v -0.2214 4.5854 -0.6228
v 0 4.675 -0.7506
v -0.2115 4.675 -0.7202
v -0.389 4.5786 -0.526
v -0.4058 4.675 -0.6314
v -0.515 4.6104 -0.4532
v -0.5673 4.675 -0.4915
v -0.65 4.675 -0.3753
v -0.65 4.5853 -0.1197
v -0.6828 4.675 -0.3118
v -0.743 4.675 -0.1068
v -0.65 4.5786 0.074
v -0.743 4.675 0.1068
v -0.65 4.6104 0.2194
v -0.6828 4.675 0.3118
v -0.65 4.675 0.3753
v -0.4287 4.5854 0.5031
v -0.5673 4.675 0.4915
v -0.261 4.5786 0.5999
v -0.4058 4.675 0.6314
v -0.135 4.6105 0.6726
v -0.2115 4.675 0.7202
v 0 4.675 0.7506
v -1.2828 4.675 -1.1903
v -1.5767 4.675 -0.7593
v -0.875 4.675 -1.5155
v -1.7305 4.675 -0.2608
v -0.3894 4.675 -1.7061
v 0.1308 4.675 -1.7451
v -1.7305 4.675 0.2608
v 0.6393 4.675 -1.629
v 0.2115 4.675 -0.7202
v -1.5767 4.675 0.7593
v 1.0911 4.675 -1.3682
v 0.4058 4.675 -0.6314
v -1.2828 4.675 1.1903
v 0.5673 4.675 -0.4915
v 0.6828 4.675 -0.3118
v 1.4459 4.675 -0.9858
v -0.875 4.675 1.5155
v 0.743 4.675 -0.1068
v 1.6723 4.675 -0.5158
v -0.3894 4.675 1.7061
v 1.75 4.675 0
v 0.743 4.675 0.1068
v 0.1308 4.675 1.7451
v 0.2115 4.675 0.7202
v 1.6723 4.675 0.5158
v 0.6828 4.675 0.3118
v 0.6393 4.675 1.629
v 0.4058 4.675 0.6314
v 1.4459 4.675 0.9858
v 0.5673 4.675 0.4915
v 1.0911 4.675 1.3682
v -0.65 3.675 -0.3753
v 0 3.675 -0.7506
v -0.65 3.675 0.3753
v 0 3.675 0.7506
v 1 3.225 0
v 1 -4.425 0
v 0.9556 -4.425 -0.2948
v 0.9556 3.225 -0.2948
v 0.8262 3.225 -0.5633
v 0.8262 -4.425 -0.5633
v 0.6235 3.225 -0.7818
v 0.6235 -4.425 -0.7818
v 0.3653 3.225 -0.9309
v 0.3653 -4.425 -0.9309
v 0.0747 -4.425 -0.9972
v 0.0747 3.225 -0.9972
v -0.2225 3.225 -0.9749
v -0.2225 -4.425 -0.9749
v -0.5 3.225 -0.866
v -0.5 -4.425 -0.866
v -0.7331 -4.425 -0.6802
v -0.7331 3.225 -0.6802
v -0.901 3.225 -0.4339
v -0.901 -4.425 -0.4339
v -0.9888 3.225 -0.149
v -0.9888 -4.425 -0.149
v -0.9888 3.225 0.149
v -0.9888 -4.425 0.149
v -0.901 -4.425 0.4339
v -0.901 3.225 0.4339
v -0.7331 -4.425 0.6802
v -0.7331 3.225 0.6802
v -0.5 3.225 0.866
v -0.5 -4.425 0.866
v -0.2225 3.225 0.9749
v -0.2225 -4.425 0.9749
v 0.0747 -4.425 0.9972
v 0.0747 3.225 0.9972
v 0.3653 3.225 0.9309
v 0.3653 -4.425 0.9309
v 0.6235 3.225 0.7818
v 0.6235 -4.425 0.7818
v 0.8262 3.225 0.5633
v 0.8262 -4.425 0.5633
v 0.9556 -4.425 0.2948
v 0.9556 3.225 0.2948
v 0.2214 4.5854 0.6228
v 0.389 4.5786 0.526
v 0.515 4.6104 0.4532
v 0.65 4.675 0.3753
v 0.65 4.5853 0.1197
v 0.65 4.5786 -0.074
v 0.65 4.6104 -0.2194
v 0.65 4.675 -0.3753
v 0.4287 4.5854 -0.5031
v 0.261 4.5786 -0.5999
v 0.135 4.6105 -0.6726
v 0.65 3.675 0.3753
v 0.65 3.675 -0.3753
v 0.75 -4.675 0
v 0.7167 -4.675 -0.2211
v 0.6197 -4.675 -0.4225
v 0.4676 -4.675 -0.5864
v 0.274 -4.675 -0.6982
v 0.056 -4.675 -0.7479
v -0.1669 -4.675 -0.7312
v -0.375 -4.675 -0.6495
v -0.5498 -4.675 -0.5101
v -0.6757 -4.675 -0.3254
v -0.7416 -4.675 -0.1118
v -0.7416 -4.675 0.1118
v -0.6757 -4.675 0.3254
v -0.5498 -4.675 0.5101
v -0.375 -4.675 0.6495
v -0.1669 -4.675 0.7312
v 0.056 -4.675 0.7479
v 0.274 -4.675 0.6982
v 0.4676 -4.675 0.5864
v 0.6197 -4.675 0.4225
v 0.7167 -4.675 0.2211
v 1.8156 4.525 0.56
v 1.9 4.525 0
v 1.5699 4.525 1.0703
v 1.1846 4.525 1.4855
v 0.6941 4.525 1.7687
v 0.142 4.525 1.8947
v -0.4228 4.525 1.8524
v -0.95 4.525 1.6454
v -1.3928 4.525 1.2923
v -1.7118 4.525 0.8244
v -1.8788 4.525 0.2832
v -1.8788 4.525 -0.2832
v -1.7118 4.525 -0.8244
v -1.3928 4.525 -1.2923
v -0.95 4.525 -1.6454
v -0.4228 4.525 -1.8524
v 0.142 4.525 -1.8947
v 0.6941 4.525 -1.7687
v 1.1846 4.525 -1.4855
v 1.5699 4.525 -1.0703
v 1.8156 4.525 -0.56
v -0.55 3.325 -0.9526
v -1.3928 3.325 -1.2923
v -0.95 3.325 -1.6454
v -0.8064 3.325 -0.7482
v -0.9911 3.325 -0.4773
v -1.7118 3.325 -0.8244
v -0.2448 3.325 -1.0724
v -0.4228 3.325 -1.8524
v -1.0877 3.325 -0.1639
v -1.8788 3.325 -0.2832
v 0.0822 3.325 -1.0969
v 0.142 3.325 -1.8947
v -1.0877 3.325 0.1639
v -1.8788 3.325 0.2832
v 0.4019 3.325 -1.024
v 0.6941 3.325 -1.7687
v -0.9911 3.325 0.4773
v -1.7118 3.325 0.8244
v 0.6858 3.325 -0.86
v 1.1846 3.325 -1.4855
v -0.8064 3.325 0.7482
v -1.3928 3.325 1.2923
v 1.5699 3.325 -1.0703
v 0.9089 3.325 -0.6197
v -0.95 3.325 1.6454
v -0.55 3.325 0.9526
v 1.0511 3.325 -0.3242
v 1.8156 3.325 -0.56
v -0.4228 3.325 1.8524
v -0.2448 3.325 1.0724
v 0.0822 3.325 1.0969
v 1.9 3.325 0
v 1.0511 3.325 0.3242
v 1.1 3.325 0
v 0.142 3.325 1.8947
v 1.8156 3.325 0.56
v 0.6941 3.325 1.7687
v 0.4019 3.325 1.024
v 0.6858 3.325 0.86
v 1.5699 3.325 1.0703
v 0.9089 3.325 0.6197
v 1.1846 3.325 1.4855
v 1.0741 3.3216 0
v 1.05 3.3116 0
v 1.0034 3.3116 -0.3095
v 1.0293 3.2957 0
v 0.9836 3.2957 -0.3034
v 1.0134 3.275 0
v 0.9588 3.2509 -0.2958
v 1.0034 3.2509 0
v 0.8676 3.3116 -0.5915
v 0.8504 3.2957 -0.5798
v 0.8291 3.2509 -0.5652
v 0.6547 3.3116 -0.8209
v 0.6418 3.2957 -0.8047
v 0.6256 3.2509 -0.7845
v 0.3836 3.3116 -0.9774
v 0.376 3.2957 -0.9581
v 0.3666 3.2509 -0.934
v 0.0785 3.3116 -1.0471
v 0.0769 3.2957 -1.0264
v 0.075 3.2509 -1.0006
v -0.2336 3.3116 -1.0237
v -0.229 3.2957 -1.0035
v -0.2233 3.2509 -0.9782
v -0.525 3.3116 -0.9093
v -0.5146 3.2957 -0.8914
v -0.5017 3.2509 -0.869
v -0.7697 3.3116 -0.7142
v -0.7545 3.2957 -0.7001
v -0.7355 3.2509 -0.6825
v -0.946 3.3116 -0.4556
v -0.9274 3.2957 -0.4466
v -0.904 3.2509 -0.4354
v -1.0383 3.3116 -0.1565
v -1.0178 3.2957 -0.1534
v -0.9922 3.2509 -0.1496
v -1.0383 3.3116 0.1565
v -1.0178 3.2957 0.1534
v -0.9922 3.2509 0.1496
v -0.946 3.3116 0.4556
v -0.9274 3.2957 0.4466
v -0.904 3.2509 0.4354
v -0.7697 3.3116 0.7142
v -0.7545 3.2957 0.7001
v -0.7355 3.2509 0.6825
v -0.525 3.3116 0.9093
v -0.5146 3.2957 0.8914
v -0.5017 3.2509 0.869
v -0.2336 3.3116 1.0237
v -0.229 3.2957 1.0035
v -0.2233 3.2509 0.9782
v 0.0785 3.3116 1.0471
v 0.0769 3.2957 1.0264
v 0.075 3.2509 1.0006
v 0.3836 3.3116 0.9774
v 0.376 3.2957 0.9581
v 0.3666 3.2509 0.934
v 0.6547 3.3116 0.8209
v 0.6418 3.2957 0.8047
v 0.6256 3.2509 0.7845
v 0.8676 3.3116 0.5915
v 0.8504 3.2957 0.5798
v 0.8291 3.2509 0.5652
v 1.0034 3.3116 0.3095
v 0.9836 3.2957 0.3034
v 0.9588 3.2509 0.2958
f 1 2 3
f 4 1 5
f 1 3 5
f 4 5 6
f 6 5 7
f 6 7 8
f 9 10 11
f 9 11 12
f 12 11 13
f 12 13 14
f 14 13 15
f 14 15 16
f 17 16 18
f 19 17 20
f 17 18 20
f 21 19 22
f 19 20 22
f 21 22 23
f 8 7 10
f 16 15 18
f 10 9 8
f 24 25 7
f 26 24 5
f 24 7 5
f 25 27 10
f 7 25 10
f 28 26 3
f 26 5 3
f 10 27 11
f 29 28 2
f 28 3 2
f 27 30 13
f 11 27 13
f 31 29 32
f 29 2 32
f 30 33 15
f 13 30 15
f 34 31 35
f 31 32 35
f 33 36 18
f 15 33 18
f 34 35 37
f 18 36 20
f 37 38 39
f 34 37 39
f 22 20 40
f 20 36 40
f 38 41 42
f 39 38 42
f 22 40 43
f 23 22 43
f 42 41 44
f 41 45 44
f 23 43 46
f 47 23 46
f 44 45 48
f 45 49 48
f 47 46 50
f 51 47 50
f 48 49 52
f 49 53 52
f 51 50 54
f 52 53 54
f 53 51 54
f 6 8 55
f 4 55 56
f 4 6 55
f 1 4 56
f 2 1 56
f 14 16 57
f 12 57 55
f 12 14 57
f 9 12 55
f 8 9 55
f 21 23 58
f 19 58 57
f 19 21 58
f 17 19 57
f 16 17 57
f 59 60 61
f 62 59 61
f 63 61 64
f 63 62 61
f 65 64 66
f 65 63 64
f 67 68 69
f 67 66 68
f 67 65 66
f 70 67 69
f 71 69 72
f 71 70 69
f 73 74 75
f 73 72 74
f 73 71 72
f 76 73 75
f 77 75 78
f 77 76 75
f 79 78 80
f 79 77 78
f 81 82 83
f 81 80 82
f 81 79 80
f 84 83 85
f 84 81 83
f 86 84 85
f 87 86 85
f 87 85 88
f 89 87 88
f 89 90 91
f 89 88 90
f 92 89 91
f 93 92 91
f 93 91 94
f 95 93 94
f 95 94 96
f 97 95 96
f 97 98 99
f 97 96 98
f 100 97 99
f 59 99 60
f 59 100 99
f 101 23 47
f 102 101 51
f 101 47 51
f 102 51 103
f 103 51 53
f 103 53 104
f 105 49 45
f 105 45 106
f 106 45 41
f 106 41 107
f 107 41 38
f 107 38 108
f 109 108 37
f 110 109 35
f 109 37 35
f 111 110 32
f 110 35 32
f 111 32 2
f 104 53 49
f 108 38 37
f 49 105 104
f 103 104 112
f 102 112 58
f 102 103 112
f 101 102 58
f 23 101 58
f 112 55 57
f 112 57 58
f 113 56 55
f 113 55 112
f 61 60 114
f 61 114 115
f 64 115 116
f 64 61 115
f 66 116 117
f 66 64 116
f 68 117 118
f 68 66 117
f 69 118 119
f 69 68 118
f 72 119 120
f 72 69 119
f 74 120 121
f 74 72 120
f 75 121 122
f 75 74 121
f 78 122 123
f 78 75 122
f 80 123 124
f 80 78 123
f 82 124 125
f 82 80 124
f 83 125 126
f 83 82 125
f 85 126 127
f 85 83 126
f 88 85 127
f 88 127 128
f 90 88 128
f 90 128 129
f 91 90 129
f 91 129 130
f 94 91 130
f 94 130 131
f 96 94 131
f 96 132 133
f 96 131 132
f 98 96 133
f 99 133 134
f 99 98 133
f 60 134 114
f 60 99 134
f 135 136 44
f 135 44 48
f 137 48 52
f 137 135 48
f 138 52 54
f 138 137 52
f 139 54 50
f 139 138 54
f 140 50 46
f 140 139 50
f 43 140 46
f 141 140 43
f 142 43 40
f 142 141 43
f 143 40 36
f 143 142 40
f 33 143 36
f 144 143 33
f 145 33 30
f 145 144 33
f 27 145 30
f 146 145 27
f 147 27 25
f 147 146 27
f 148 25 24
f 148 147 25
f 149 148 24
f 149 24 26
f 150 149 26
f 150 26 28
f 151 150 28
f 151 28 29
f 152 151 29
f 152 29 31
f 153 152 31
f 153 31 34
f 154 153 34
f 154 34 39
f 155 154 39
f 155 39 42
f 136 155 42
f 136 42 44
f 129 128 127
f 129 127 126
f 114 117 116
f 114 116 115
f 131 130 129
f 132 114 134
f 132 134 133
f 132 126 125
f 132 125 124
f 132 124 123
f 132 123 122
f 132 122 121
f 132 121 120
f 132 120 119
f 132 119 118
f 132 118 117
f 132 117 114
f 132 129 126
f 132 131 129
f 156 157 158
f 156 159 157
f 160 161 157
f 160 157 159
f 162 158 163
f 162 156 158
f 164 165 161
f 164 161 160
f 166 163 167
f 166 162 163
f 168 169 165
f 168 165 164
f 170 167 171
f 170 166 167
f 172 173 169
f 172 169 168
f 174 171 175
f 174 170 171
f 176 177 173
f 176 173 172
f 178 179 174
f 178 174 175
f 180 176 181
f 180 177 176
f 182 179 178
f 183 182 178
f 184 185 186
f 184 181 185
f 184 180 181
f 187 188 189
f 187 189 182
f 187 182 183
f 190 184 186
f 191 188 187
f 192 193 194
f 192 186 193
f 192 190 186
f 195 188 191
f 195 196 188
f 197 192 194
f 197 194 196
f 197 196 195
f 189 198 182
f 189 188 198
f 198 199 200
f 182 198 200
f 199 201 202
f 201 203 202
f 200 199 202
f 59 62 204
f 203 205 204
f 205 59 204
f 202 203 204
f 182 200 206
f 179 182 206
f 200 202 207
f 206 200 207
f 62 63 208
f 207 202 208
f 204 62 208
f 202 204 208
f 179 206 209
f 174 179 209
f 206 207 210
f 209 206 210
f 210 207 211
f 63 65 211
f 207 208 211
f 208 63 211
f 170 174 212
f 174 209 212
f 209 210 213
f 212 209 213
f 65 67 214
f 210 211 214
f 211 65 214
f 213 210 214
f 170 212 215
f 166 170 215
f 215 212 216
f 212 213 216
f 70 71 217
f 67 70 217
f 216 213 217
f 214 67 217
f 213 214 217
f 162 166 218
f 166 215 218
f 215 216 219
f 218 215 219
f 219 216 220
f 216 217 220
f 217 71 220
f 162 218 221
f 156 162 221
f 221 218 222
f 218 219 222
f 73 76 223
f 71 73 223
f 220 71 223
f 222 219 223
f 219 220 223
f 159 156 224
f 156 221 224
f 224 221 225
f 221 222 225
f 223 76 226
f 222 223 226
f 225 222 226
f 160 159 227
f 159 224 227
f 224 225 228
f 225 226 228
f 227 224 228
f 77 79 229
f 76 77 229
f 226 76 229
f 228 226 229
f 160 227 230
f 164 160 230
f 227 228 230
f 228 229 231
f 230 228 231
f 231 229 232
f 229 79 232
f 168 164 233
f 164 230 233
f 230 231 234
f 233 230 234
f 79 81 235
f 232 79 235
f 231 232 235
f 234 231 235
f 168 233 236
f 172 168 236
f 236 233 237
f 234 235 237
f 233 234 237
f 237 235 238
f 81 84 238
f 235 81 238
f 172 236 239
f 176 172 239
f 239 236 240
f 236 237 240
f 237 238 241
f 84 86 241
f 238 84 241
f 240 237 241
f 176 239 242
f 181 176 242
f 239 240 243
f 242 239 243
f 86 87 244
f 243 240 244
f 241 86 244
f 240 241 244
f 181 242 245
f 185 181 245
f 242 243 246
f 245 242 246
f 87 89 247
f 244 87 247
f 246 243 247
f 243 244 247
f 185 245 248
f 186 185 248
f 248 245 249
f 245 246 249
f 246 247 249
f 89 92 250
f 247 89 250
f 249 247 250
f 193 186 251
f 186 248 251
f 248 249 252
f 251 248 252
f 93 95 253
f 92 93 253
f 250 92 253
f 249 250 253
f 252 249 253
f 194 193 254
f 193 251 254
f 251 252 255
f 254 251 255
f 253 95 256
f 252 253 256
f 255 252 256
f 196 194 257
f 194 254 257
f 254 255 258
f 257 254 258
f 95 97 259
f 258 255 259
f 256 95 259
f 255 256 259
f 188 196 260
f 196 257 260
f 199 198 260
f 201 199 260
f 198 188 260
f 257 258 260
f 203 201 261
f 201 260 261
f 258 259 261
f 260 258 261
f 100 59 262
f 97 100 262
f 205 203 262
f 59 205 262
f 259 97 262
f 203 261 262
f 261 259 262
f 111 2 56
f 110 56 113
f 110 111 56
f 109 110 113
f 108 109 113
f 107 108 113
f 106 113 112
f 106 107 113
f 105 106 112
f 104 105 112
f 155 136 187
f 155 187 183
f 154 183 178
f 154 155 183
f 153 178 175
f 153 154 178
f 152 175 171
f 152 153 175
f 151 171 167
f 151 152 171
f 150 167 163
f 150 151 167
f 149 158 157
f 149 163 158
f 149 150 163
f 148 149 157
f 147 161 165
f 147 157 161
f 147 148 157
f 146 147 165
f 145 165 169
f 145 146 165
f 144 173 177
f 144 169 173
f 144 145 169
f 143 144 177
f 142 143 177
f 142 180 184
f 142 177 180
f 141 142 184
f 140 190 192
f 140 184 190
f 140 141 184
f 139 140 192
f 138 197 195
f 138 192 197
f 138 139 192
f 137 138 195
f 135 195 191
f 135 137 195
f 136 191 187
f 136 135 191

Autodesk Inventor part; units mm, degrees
ref_plane "YZ Plane" through (0, 0, 0) normal (1, 0, 0) x (0, 1, 0)
ref_plane "XZ Plane" through (0, 0, 0) normal (0, 1, 0) x (-1, 0, 0)
ref_plane "XY Plane" through (0, 0, 0) normal (0, 0, 1) x (1, 0, 0)
sketch "Sketch1" plane through (0, 0, 0) normal (0, 0, 1) x (1, 0, 0)
  line L0 (0, 4.675) -> (0, -4.675)
  line L1 (0, -4.675) -> (0.75, -4.675)
  line L2 (0.75, -4.675) -> (1, -4.425)
  line L3 (1, -4.425) -> (1, 3.225)
  line L4 (1.1, 3.325) -> (1.9, 3.325)
  line L5 (1.9, 3.325) -> (1.9, 4.525)
  line L6 (1.75, 4.675) -> (0, 4.675)
  arc A0 (1.1, 3.325) -> (1, 3.225) centre (1.1, 3.225) ccw
  line L7 (1.75, 4.675) -> (1.9, 4.525)
  point P0 (0, 0)
  point P1 (1.9, 4.675)
  point P2 (0, 0)
  dimension "d0" = 3.8
  dimension "d1" = 1.35
  dimension "d3" = 2
  dimension "d4" = 2.2
  dimension "d5" = 135
  dimension "d6" = 0.25
  dimension "d7" = 8
  dimension "d18" = 0.15
  dimension "d22" = 0.15
revolve "Revolution1" add sketch "Sketch1" angle 360 about axis through (0, 4.675, 0) along (0, -1, 0)
sketch "Sketch2" plane through (0, 4.675, 0) normal (0, 1, 0) x (1, 0, 0)
  line L0 (0, -0.7506) -> (-0.65, -0.3753)
  line L1 (-0.65, -0.3753) -> (-0.65, 0.3753)
  line L2 (-0.65, 0.3753) -> (0, 0.7506)
  line L3 (0, 0.7506) -> (0.65, 0.3753)
  line L4 (0.65, 0.3753) -> (0.65, -0.3753)
  line L5 (0.65, -0.3753) -> (0, -0.7506)
  point P0 (0, 0)
  point P1 (0, 0)
  dimension "d11" = 1.3
extrude "Extrusion1" cut sketch "Sketch2" against normal blind 1
thread "Thread1" size "M2x0.4" class "6g" standard "ANSI Metric M Profile" full length
sketch "Sketch3" plane through (0, 0, 0) normal (1, 0, 0) x (0, 1, 0)
  line L0 (4.675, 0.7506) -> (4.675, 0.3753) projected
  line L1 (4.675, 0.7506) -> (4.175, 0.2506)
  line L2 (4.175, 0.2506) -> (4.675, 0.2506)
  line L3 (4.675, 0.2506) -> (4.675, 0.7506)
  line L4 (-0.7, 0) -> (4.2, 0) projected
  point P0 (0, 0)
  dimension "d16" = 0.5
revolve "Revolution2" cut sketch "Sketch3" angle 360 about axis through (0, -10, 0) along (0, 1, 0)
equation "\"d22\" = d18"
properties part number "48-0280" material "Stainless Steel"
